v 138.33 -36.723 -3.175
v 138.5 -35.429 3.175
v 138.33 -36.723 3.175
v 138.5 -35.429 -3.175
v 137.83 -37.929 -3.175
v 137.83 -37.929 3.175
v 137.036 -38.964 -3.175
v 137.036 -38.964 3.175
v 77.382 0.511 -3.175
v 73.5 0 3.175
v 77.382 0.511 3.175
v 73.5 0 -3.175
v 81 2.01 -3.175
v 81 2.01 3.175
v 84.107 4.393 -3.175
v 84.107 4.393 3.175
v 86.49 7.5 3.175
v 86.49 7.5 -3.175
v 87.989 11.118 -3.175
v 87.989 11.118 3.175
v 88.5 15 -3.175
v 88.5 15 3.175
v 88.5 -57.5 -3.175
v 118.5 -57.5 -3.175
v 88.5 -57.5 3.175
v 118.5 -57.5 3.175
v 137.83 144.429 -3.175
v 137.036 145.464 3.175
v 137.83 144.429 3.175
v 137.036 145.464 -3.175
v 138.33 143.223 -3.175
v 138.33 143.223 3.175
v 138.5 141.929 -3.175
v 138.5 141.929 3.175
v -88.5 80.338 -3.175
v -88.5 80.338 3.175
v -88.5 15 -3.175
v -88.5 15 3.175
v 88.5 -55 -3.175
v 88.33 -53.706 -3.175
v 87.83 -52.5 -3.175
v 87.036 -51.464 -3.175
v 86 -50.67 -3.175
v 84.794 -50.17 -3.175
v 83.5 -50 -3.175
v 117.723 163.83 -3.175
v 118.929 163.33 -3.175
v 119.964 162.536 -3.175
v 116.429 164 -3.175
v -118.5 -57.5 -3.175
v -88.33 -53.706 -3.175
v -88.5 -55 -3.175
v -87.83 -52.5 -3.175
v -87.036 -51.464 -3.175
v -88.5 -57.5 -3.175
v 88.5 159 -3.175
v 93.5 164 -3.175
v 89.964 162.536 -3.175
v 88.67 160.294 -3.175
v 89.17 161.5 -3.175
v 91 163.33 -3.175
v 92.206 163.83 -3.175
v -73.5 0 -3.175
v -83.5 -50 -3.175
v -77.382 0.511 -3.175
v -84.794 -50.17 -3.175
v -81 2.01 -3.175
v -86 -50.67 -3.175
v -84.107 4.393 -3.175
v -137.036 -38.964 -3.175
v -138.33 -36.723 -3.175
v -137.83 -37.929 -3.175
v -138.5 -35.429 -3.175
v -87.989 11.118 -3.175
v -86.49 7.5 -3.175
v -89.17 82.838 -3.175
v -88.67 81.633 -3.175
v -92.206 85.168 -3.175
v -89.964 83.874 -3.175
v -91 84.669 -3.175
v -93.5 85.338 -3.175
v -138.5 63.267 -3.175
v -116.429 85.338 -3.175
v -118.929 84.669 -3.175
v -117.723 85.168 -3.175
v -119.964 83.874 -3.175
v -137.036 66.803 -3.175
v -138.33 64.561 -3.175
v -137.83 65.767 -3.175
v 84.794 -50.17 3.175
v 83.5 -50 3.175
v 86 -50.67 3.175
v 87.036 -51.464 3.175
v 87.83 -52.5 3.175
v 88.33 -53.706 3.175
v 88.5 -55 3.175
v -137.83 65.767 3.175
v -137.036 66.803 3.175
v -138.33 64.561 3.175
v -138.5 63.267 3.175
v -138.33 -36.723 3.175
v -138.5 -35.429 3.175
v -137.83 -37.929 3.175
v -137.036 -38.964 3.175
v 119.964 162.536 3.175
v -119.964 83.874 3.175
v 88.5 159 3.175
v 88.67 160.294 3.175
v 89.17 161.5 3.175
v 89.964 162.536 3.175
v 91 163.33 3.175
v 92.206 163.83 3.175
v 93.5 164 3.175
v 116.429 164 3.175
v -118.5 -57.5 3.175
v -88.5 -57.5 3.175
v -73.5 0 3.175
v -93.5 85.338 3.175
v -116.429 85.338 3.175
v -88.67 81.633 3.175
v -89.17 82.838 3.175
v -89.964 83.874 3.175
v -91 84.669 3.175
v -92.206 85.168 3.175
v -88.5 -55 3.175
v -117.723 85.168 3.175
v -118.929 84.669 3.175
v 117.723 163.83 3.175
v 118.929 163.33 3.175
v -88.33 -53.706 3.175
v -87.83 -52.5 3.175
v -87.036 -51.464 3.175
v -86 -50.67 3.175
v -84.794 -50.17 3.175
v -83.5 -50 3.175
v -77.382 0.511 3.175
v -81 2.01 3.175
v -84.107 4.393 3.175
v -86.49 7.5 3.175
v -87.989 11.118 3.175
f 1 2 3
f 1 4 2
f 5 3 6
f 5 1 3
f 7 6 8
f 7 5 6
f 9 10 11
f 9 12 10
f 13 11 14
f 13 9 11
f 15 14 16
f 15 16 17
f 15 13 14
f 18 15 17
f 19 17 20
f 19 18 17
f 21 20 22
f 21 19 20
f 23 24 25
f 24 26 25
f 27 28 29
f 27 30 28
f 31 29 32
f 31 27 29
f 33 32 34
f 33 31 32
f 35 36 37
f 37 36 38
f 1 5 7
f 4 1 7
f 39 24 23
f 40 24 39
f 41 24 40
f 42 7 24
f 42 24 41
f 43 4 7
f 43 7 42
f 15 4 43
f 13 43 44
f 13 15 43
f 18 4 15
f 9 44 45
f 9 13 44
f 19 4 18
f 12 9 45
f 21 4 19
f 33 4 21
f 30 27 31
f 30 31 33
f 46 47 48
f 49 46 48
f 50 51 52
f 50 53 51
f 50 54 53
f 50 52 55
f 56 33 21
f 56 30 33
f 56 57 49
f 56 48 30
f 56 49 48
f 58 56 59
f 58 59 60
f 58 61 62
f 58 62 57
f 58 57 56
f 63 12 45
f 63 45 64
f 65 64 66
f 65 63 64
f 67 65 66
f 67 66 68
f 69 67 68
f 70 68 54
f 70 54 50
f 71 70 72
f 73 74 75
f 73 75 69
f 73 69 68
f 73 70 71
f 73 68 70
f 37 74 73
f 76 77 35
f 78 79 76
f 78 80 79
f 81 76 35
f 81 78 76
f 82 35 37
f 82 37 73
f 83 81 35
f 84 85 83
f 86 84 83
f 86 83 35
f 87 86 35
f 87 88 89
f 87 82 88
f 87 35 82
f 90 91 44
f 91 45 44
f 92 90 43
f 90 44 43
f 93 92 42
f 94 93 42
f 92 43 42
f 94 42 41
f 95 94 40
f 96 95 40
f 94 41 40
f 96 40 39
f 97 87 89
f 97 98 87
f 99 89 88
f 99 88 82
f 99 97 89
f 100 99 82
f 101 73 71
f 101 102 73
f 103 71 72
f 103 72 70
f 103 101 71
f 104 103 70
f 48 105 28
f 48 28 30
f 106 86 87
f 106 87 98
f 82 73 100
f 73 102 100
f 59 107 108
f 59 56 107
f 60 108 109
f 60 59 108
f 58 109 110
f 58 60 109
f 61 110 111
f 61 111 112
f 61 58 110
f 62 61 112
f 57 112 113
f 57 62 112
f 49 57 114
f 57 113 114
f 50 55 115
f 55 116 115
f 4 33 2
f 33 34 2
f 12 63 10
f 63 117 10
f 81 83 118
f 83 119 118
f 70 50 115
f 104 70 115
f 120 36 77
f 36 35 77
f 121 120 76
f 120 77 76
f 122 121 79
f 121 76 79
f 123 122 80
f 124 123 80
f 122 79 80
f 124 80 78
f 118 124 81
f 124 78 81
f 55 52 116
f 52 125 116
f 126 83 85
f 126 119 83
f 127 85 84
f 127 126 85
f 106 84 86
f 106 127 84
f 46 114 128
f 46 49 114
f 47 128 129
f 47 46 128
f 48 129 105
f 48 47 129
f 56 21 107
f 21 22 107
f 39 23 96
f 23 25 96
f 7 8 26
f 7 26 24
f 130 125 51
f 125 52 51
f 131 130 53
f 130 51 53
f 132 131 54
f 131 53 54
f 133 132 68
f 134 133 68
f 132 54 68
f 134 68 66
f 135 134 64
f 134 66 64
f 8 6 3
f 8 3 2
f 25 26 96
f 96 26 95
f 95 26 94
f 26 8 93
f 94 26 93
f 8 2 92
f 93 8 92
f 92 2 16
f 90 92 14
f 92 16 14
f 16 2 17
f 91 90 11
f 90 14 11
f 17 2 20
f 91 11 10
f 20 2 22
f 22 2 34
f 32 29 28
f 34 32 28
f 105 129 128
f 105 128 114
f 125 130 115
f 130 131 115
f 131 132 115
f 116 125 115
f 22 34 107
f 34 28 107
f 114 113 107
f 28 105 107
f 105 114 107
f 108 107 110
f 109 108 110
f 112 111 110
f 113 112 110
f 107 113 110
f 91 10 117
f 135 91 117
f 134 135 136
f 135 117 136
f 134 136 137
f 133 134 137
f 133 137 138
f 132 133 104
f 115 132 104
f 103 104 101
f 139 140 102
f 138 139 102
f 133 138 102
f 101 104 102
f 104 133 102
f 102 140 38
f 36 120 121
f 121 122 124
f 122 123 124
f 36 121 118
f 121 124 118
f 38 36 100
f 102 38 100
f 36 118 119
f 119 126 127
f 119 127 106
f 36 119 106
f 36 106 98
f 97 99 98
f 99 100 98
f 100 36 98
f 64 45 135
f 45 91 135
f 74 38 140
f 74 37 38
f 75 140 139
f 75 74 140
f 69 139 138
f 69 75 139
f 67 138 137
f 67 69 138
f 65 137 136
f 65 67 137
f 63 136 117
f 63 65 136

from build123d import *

# Parameters (mm, degrees)
BOSS_EXTRUDE1_DEPTH      = 3.175
BOSS_EXTRUDE1_DEPTH_BACK = 3.175
CHAMFER1_SIZE            = 20
FILLET1_R                = 15
FILLET2_R                = 5


with BuildPart() as part:
    # Sketch2 → Boss-Extrude1 (new body, two sides)
    with BuildSketch(Plane.XY) as boss_extrude1_sk:
        Polygon((-138.5, 85.338455572), (-88.5, 85.338455572), (-88.5, 0), (88.5, 0), (88.5, 164), (138.5, 164), (138.5, -57.5), (88.5, -57.5), (88.5, -50), (-88.5, -50), (-88.5, -57.5), (-138.5, -57.5), align=None)
    extrude(amount=BOSS_EXTRUDE1_DEPTH)
    extrude(boss_extrude1_sk.sketch, amount=-BOSS_EXTRUDE1_DEPTH_BACK)

    # Chamfer1
    chamfer1_edges = [part.edges().sort_by_distance(p)[0] for p in [
        (-138.5, 85.338455572, 0),
        (138.5, 164, 0),
        (138.5, -57.5, 0),
        (-138.5, -57.5, 0),
    ]]
    chamfer(chamfer1_edges, length=CHAMFER1_SIZE)

    # Fillet1
    fillet1_edges = [part.edges().sort_by_distance(p)[0] for p in [
        (-88.5, 0, 0),
        (88.5, 0, 0),
    ]]
    fillet(fillet1_edges, radius=FILLET1_R)

    # Fillet2
    fillet2_edges = [part.edges().sort_by_distance(p)[0] for p in [
        (-88.5, 85.338455572, 0),
        (88.5, 164, 0),
        (88.5, -50, 0),
        (-88.5, -50, 0),
        (-138.5, 65.338455572, 0),
        (-138.5, -37.5, 0),
        (138.5, 144, 0),
        (138.5, -37.5, 0),
        (118.5, 164, 0),
        (-118.5, 85.338455572, 0),
    ]]
    fillet(fillet2_edges, radius=FILLET2_R)


solid = part.part
